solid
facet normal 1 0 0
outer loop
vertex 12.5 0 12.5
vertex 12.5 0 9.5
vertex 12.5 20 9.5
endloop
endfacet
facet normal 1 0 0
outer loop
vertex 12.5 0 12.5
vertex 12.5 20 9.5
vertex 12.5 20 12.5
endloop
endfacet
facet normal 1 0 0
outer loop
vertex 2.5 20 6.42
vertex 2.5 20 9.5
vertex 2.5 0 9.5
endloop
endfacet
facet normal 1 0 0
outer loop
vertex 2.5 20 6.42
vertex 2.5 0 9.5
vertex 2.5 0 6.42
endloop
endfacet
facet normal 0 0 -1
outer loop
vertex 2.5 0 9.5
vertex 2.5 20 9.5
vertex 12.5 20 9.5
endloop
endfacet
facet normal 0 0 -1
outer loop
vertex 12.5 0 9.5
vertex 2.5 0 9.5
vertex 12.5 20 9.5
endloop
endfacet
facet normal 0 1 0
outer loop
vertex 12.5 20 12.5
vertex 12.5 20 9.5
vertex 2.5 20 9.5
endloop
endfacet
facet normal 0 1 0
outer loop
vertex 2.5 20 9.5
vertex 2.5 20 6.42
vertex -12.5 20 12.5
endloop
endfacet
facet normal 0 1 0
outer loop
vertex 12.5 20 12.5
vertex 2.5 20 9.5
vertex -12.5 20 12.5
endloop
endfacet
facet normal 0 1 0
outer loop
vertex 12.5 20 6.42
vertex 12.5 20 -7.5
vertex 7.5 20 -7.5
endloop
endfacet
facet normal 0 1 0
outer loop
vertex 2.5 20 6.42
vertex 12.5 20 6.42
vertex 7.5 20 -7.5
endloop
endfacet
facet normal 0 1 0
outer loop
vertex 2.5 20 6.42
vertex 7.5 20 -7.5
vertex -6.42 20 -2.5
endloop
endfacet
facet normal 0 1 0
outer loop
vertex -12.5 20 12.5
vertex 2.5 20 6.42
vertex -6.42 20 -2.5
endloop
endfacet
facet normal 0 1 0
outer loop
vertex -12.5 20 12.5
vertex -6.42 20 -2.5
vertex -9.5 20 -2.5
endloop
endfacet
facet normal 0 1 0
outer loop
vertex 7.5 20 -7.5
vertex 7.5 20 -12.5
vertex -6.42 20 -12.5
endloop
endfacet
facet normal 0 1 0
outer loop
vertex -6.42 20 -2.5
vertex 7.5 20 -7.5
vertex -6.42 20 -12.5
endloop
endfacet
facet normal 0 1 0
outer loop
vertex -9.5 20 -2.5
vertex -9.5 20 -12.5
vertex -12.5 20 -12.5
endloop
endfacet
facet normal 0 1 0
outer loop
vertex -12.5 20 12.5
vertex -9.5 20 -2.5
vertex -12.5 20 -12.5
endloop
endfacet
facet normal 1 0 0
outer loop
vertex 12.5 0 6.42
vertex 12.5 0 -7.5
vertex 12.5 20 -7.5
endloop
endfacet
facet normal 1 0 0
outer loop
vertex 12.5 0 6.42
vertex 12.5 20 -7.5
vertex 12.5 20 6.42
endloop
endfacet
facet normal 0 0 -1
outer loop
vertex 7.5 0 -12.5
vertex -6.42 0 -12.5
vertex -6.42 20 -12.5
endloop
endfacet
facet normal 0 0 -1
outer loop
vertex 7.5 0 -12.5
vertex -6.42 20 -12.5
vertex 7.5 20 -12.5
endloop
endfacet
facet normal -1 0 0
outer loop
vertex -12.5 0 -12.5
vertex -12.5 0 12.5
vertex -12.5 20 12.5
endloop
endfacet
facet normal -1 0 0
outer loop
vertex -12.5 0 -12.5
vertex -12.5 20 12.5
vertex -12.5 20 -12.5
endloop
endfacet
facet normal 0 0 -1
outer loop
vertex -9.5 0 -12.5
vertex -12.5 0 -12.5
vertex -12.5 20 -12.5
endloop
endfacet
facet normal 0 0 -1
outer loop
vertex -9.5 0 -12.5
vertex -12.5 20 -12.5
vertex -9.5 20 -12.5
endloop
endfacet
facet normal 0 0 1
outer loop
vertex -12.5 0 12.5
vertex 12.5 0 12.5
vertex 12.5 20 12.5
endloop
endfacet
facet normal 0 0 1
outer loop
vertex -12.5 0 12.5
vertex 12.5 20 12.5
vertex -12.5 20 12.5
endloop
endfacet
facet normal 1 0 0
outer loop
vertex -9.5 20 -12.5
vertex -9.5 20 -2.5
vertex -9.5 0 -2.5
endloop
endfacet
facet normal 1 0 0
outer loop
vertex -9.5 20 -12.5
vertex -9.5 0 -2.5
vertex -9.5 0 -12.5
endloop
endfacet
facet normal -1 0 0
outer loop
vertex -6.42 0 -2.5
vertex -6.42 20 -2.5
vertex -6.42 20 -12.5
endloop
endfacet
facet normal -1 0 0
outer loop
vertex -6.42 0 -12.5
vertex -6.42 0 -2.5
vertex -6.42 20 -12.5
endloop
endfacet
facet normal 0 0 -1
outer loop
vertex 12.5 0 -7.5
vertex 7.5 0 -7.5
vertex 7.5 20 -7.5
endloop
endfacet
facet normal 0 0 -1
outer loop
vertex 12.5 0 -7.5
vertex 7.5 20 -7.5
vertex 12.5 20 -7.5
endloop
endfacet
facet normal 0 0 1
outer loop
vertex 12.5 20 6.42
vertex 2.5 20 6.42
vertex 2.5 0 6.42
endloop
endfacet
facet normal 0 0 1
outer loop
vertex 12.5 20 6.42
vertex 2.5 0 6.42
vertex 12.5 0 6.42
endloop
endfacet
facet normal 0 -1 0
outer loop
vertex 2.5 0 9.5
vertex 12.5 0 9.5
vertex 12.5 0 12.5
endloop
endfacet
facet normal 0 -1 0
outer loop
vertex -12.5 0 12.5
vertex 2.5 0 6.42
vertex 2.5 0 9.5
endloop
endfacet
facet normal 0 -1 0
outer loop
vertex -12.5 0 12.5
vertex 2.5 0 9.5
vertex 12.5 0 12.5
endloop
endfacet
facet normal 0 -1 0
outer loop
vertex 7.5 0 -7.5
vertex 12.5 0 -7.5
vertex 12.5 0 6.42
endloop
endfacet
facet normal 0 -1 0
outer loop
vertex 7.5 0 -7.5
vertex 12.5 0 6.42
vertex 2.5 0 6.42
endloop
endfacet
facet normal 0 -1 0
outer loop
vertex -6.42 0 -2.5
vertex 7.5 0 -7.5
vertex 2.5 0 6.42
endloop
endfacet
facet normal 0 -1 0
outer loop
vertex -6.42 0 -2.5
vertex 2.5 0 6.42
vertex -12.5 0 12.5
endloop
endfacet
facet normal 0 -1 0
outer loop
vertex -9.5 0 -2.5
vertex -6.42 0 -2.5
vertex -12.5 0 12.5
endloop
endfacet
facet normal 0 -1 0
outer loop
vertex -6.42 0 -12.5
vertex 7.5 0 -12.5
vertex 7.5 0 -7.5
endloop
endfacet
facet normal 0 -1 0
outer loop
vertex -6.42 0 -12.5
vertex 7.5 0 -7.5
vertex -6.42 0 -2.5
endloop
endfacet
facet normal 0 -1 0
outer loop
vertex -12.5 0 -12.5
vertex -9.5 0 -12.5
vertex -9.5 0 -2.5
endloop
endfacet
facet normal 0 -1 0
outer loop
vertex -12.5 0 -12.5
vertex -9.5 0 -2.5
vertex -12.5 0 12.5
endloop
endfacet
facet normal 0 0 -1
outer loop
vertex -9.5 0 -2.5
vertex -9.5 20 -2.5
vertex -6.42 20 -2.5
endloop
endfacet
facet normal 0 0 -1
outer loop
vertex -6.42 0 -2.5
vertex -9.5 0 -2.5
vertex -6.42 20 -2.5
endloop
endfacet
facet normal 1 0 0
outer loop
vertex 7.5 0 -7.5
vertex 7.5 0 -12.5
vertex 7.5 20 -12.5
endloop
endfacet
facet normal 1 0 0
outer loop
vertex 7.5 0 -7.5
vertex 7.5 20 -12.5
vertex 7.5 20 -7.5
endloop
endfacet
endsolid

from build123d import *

# Parameters (mm, degrees)
SALIENTE_EXTRUIR1_DEPTH = 20
CROQUIS2_W              = 10
CROQUIS2_H              = 3.08
CROQUIS2_W_2            = 3.08
CROQUIS2_H_2            = 10
CORTAR_EXTRUIR2_DEPTH   = 20


with BuildPart() as part:
    # Croquis1 → Saliente-Extruir1 (new body)
    with BuildSketch(Plane(origin=(0, 0, 0), x_dir=(1, 0, 0), z_dir=(0, 1, 0))):
        Polygon((7.5, 12.5), (7.5, 7.5), (12.5, 7.5), (12.5, -12.5), (-12.5, -12.5), (-12.5, 12.5), align=None)
    extrude(amount=SALIENTE_EXTRUIR1_DEPTH)

    # Croquis2 → Cortar-Extruir2 (cut)
    with BuildSketch(Plane(origin=(0, 20, 0), x_dir=(1, 0, 0), z_dir=(0, 1, 0))):
        with Locations((7.5, -7.96)):
            Rectangle(CROQUIS2_W, CROQUIS2_H)
        with Locations((-7.96, 7.5)):
            Rectangle(CROQUIS2_W_2, CROQUIS2_H_2)
    extrude(amount=-CORTAR_EXTRUIR2_DEPTH, mode=Mode.SUBTRACT)


solid = part.part
